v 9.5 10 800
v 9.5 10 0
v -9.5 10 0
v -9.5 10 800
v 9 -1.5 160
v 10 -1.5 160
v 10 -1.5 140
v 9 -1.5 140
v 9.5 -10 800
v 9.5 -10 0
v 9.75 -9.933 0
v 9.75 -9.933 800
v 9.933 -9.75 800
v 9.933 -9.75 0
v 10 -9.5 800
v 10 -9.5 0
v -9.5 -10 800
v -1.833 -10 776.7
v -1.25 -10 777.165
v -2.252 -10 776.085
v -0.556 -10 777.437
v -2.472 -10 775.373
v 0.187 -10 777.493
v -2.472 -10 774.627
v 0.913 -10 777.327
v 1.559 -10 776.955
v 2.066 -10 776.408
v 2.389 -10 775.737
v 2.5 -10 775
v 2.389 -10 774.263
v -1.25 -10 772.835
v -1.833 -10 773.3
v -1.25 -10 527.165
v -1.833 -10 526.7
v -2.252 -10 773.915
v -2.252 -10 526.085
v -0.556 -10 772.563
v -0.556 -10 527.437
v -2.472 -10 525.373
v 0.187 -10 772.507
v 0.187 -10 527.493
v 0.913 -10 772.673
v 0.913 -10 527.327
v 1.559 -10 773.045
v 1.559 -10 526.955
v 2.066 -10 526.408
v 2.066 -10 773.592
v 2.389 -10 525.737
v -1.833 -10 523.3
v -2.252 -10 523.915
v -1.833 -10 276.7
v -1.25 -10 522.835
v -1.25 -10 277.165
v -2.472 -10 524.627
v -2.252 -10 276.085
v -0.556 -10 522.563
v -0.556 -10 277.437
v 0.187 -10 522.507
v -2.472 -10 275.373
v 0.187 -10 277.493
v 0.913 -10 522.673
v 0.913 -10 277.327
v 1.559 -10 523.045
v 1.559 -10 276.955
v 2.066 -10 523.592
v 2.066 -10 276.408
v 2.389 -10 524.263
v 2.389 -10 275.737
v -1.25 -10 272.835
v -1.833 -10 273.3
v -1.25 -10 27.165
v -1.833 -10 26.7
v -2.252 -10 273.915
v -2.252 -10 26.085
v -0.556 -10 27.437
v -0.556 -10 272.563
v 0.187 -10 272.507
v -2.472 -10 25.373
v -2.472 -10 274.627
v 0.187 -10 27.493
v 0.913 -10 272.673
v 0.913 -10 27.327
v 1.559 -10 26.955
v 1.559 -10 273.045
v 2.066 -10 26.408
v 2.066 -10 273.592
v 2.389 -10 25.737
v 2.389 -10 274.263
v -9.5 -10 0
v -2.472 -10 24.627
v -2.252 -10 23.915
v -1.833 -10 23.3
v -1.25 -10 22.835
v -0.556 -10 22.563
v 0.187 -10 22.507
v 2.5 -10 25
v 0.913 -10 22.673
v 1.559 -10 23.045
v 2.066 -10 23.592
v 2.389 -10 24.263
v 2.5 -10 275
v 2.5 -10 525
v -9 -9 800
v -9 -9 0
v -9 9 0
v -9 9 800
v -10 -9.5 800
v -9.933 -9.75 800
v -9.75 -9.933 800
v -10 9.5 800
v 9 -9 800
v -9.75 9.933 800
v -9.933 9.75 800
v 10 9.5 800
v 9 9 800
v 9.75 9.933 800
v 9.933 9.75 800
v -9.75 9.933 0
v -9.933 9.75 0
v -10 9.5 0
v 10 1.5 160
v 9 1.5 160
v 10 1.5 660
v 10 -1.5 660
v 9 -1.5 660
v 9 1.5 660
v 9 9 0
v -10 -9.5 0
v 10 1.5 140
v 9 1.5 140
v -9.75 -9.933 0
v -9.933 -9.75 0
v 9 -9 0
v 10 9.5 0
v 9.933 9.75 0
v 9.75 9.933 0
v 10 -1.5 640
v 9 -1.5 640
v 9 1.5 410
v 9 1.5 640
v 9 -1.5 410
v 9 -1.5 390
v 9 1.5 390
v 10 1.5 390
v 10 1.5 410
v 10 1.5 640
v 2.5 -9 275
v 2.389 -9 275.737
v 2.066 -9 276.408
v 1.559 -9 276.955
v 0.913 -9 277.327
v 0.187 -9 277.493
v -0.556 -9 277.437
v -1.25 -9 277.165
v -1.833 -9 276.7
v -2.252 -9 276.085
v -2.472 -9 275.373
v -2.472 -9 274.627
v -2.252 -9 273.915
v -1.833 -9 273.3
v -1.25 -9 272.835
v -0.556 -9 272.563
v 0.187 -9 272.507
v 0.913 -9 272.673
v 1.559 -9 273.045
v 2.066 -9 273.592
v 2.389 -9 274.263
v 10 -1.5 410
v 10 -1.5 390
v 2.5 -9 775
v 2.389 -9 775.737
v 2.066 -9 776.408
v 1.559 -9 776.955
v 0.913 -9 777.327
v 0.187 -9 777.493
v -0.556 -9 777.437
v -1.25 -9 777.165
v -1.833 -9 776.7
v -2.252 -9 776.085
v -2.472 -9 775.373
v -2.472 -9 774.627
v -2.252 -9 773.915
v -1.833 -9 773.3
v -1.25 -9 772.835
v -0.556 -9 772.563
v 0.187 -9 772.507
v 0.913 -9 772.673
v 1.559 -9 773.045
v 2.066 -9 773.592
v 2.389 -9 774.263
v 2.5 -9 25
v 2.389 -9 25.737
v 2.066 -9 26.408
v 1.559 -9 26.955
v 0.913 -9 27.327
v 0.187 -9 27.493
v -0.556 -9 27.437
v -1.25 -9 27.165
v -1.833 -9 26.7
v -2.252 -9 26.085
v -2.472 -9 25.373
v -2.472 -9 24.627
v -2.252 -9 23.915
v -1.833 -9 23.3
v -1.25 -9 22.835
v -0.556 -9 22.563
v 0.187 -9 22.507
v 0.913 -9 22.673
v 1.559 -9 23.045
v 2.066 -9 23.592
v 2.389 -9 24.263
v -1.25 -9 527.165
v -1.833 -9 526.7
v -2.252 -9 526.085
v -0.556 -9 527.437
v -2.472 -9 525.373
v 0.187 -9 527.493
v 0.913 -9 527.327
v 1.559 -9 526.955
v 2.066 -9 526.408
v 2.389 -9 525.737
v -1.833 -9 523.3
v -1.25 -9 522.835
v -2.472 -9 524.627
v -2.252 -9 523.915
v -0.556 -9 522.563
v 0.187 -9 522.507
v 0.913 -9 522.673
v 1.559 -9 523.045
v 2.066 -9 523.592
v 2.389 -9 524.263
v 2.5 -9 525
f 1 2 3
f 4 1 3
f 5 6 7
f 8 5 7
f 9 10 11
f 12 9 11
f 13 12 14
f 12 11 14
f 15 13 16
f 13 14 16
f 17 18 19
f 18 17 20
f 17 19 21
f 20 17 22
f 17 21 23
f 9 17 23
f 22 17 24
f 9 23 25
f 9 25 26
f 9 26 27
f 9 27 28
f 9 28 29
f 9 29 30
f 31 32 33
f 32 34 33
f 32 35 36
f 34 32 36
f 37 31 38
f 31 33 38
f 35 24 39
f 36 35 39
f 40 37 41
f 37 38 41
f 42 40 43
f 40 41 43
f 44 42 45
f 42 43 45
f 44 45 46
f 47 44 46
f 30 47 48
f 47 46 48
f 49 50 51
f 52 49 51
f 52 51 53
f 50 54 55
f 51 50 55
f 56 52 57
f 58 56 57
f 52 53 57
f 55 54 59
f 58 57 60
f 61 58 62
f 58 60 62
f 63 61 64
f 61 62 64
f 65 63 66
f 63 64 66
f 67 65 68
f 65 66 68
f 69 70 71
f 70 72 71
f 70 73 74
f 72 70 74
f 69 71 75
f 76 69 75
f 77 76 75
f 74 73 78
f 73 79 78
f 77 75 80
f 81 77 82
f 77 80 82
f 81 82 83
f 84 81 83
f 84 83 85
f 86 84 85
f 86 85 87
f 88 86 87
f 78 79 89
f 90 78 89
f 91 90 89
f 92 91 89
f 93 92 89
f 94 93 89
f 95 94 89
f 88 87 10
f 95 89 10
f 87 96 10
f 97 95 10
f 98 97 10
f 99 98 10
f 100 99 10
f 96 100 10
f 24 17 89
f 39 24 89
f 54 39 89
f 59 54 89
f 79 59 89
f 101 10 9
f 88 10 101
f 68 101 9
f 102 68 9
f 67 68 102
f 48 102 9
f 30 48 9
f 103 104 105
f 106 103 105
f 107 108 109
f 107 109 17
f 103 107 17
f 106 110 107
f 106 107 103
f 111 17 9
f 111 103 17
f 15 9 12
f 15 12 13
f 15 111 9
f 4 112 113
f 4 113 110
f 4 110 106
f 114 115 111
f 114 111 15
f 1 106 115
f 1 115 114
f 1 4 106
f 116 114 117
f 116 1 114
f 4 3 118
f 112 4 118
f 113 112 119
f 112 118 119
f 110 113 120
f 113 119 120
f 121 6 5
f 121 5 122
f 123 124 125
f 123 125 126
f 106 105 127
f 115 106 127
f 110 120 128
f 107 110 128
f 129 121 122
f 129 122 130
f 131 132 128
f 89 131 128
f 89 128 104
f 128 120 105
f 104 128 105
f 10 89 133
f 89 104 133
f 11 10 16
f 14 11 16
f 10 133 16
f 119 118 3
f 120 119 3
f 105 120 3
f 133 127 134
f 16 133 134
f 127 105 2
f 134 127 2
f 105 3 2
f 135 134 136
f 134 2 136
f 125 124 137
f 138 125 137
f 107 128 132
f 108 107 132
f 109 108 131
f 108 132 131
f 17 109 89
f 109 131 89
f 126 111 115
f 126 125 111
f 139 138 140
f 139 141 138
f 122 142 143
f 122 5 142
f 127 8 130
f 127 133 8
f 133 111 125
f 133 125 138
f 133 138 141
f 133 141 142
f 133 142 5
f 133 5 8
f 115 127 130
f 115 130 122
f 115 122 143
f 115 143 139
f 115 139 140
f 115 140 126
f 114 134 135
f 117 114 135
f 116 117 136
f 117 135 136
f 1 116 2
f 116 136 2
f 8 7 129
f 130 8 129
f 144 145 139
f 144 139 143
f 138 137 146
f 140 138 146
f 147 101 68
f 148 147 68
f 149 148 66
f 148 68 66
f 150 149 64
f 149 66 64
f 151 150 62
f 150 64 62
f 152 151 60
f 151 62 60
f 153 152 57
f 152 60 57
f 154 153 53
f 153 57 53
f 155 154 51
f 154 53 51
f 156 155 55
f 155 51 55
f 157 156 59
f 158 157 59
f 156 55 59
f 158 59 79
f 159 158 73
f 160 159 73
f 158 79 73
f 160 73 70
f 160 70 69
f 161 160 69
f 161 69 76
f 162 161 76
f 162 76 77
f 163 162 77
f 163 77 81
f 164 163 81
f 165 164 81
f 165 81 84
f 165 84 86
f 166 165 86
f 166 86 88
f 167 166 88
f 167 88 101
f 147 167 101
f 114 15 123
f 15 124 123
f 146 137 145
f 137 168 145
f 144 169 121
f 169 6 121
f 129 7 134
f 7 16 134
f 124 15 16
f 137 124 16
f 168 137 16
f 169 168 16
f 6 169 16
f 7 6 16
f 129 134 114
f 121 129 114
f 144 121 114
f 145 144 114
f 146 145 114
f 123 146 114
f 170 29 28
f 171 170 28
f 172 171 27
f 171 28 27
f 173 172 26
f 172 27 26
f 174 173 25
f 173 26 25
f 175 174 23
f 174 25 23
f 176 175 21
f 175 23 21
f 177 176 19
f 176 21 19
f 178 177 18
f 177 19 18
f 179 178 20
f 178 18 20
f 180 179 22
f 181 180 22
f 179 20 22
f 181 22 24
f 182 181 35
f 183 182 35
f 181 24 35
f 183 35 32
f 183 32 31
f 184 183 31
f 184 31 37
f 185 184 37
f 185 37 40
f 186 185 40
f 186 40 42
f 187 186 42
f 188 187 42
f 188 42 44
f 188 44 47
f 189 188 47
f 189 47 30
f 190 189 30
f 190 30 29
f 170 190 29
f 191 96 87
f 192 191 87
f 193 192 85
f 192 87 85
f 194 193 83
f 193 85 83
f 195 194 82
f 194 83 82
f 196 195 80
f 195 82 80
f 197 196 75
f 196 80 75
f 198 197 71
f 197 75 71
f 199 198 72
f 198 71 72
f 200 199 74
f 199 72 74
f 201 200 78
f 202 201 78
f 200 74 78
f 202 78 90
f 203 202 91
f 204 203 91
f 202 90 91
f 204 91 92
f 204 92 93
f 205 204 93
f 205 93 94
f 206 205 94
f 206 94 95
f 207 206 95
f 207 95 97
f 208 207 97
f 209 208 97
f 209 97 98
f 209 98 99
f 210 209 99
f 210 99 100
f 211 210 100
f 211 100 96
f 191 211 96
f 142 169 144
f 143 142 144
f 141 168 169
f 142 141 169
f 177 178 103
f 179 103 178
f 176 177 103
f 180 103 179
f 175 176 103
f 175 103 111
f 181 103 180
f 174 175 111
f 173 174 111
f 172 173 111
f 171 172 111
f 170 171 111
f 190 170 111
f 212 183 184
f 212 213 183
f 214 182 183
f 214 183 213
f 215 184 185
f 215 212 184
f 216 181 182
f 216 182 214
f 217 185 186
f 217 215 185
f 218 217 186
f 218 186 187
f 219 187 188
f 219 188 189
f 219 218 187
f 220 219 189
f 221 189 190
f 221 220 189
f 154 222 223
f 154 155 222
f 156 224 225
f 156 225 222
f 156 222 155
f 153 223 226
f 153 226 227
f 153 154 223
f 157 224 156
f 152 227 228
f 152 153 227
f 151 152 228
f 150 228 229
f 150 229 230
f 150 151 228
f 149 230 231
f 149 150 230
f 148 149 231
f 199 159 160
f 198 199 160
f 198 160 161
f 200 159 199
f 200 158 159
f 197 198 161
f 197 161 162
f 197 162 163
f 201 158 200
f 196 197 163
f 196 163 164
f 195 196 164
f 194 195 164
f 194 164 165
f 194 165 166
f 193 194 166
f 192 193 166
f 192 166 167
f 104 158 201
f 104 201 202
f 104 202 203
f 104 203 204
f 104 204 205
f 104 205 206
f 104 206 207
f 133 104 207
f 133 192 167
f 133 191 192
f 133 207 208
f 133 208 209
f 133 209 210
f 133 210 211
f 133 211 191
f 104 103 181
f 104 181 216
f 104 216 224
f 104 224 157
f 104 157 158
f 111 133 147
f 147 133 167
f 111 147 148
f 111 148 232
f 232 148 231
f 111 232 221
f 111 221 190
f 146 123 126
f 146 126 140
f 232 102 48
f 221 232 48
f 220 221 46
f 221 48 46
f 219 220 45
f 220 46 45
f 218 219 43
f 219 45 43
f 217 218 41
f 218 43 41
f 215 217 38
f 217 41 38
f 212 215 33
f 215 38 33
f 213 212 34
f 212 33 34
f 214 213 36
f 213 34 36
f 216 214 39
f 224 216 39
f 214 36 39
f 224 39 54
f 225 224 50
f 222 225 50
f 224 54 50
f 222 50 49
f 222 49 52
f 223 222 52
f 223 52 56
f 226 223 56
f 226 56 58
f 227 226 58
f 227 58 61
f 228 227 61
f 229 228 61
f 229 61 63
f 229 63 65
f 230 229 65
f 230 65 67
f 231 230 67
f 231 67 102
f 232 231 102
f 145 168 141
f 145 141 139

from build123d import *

# Parameters (mm, degrees)
SKETCH1_W           = 18
SKETCH1_H           = 18
EXTRUDE_THIN1_DEPTH = 800
SKETCH2_W           = 20
SKETCH2_H           = 3
CUT_EXTRUDE1_DEPTH  = 10
SKETCH3_R           = 2.5
CUT_EXTRUDE2_DEPTH  = 10


with BuildPart() as part:
    # Sketch1 → Extrude-Thin1 (new body)
    with BuildSketch(Plane.XY):
        with BuildLine():
            Line((-10, 9.5), (-10, -9.5))
            ThreePointArc((-10, -9.5), (-9.853553391, -9.853553391), (-9.5, -10))
            Line((-9.5, -10), (9.5, -10))
            ThreePointArc((9.5, -10), (9.853553391, -9.853553391), (10, -9.5))
            Line((10, -9.5), (10, 9.5))
            ThreePointArc((10, 9.5), (9.853553391, 9.853553391), (9.5, 10))
            Line((9.5, 10), (-9.5, 10))
            ThreePointArc((-9.5, 10), (-9.853553391, 9.853553391), (-10, 9.5))
        make_face()
        Rectangle(SKETCH1_W, SKETCH1_H, mode=Mode.SUBTRACT)
    extrude(amount=EXTRUDE_THIN1_DEPTH)

    # Sketch2 → Cut-Extrude1 (cut)
    with BuildSketch(Plane(origin=(10, 0, 0), x_dir=(0, 0, -1), z_dir=(1, 0, 0))):
        with Locations((-150, 0)):
            Rectangle(SKETCH2_W, SKETCH2_H)
        with Locations((-400, 0)):
            Rectangle(SKETCH2_W, SKETCH2_H)
        with Locations((-650, 0)):
            Rectangle(SKETCH2_W, SKETCH2_H)
    extrude(amount=-CUT_EXTRUDE1_DEPTH, mode=Mode.SUBTRACT)

    # Sketch3 → Cut-Extrude2 (cut)
    with BuildSketch(Plane.XZ.offset(10)):
        with Locations((0, 25)):
            Circle(SKETCH3_R)
        with Locations((0, 275)):
            Circle(SKETCH3_R)
        with Locations((0, 525)):
            Circle(SKETCH3_R)
        with Locations((0, 775)):
            Circle(SKETCH3_R)
    extrude(amount=-CUT_EXTRUDE2_DEPTH, mode=Mode.SUBTRACT)


solid = part.part
